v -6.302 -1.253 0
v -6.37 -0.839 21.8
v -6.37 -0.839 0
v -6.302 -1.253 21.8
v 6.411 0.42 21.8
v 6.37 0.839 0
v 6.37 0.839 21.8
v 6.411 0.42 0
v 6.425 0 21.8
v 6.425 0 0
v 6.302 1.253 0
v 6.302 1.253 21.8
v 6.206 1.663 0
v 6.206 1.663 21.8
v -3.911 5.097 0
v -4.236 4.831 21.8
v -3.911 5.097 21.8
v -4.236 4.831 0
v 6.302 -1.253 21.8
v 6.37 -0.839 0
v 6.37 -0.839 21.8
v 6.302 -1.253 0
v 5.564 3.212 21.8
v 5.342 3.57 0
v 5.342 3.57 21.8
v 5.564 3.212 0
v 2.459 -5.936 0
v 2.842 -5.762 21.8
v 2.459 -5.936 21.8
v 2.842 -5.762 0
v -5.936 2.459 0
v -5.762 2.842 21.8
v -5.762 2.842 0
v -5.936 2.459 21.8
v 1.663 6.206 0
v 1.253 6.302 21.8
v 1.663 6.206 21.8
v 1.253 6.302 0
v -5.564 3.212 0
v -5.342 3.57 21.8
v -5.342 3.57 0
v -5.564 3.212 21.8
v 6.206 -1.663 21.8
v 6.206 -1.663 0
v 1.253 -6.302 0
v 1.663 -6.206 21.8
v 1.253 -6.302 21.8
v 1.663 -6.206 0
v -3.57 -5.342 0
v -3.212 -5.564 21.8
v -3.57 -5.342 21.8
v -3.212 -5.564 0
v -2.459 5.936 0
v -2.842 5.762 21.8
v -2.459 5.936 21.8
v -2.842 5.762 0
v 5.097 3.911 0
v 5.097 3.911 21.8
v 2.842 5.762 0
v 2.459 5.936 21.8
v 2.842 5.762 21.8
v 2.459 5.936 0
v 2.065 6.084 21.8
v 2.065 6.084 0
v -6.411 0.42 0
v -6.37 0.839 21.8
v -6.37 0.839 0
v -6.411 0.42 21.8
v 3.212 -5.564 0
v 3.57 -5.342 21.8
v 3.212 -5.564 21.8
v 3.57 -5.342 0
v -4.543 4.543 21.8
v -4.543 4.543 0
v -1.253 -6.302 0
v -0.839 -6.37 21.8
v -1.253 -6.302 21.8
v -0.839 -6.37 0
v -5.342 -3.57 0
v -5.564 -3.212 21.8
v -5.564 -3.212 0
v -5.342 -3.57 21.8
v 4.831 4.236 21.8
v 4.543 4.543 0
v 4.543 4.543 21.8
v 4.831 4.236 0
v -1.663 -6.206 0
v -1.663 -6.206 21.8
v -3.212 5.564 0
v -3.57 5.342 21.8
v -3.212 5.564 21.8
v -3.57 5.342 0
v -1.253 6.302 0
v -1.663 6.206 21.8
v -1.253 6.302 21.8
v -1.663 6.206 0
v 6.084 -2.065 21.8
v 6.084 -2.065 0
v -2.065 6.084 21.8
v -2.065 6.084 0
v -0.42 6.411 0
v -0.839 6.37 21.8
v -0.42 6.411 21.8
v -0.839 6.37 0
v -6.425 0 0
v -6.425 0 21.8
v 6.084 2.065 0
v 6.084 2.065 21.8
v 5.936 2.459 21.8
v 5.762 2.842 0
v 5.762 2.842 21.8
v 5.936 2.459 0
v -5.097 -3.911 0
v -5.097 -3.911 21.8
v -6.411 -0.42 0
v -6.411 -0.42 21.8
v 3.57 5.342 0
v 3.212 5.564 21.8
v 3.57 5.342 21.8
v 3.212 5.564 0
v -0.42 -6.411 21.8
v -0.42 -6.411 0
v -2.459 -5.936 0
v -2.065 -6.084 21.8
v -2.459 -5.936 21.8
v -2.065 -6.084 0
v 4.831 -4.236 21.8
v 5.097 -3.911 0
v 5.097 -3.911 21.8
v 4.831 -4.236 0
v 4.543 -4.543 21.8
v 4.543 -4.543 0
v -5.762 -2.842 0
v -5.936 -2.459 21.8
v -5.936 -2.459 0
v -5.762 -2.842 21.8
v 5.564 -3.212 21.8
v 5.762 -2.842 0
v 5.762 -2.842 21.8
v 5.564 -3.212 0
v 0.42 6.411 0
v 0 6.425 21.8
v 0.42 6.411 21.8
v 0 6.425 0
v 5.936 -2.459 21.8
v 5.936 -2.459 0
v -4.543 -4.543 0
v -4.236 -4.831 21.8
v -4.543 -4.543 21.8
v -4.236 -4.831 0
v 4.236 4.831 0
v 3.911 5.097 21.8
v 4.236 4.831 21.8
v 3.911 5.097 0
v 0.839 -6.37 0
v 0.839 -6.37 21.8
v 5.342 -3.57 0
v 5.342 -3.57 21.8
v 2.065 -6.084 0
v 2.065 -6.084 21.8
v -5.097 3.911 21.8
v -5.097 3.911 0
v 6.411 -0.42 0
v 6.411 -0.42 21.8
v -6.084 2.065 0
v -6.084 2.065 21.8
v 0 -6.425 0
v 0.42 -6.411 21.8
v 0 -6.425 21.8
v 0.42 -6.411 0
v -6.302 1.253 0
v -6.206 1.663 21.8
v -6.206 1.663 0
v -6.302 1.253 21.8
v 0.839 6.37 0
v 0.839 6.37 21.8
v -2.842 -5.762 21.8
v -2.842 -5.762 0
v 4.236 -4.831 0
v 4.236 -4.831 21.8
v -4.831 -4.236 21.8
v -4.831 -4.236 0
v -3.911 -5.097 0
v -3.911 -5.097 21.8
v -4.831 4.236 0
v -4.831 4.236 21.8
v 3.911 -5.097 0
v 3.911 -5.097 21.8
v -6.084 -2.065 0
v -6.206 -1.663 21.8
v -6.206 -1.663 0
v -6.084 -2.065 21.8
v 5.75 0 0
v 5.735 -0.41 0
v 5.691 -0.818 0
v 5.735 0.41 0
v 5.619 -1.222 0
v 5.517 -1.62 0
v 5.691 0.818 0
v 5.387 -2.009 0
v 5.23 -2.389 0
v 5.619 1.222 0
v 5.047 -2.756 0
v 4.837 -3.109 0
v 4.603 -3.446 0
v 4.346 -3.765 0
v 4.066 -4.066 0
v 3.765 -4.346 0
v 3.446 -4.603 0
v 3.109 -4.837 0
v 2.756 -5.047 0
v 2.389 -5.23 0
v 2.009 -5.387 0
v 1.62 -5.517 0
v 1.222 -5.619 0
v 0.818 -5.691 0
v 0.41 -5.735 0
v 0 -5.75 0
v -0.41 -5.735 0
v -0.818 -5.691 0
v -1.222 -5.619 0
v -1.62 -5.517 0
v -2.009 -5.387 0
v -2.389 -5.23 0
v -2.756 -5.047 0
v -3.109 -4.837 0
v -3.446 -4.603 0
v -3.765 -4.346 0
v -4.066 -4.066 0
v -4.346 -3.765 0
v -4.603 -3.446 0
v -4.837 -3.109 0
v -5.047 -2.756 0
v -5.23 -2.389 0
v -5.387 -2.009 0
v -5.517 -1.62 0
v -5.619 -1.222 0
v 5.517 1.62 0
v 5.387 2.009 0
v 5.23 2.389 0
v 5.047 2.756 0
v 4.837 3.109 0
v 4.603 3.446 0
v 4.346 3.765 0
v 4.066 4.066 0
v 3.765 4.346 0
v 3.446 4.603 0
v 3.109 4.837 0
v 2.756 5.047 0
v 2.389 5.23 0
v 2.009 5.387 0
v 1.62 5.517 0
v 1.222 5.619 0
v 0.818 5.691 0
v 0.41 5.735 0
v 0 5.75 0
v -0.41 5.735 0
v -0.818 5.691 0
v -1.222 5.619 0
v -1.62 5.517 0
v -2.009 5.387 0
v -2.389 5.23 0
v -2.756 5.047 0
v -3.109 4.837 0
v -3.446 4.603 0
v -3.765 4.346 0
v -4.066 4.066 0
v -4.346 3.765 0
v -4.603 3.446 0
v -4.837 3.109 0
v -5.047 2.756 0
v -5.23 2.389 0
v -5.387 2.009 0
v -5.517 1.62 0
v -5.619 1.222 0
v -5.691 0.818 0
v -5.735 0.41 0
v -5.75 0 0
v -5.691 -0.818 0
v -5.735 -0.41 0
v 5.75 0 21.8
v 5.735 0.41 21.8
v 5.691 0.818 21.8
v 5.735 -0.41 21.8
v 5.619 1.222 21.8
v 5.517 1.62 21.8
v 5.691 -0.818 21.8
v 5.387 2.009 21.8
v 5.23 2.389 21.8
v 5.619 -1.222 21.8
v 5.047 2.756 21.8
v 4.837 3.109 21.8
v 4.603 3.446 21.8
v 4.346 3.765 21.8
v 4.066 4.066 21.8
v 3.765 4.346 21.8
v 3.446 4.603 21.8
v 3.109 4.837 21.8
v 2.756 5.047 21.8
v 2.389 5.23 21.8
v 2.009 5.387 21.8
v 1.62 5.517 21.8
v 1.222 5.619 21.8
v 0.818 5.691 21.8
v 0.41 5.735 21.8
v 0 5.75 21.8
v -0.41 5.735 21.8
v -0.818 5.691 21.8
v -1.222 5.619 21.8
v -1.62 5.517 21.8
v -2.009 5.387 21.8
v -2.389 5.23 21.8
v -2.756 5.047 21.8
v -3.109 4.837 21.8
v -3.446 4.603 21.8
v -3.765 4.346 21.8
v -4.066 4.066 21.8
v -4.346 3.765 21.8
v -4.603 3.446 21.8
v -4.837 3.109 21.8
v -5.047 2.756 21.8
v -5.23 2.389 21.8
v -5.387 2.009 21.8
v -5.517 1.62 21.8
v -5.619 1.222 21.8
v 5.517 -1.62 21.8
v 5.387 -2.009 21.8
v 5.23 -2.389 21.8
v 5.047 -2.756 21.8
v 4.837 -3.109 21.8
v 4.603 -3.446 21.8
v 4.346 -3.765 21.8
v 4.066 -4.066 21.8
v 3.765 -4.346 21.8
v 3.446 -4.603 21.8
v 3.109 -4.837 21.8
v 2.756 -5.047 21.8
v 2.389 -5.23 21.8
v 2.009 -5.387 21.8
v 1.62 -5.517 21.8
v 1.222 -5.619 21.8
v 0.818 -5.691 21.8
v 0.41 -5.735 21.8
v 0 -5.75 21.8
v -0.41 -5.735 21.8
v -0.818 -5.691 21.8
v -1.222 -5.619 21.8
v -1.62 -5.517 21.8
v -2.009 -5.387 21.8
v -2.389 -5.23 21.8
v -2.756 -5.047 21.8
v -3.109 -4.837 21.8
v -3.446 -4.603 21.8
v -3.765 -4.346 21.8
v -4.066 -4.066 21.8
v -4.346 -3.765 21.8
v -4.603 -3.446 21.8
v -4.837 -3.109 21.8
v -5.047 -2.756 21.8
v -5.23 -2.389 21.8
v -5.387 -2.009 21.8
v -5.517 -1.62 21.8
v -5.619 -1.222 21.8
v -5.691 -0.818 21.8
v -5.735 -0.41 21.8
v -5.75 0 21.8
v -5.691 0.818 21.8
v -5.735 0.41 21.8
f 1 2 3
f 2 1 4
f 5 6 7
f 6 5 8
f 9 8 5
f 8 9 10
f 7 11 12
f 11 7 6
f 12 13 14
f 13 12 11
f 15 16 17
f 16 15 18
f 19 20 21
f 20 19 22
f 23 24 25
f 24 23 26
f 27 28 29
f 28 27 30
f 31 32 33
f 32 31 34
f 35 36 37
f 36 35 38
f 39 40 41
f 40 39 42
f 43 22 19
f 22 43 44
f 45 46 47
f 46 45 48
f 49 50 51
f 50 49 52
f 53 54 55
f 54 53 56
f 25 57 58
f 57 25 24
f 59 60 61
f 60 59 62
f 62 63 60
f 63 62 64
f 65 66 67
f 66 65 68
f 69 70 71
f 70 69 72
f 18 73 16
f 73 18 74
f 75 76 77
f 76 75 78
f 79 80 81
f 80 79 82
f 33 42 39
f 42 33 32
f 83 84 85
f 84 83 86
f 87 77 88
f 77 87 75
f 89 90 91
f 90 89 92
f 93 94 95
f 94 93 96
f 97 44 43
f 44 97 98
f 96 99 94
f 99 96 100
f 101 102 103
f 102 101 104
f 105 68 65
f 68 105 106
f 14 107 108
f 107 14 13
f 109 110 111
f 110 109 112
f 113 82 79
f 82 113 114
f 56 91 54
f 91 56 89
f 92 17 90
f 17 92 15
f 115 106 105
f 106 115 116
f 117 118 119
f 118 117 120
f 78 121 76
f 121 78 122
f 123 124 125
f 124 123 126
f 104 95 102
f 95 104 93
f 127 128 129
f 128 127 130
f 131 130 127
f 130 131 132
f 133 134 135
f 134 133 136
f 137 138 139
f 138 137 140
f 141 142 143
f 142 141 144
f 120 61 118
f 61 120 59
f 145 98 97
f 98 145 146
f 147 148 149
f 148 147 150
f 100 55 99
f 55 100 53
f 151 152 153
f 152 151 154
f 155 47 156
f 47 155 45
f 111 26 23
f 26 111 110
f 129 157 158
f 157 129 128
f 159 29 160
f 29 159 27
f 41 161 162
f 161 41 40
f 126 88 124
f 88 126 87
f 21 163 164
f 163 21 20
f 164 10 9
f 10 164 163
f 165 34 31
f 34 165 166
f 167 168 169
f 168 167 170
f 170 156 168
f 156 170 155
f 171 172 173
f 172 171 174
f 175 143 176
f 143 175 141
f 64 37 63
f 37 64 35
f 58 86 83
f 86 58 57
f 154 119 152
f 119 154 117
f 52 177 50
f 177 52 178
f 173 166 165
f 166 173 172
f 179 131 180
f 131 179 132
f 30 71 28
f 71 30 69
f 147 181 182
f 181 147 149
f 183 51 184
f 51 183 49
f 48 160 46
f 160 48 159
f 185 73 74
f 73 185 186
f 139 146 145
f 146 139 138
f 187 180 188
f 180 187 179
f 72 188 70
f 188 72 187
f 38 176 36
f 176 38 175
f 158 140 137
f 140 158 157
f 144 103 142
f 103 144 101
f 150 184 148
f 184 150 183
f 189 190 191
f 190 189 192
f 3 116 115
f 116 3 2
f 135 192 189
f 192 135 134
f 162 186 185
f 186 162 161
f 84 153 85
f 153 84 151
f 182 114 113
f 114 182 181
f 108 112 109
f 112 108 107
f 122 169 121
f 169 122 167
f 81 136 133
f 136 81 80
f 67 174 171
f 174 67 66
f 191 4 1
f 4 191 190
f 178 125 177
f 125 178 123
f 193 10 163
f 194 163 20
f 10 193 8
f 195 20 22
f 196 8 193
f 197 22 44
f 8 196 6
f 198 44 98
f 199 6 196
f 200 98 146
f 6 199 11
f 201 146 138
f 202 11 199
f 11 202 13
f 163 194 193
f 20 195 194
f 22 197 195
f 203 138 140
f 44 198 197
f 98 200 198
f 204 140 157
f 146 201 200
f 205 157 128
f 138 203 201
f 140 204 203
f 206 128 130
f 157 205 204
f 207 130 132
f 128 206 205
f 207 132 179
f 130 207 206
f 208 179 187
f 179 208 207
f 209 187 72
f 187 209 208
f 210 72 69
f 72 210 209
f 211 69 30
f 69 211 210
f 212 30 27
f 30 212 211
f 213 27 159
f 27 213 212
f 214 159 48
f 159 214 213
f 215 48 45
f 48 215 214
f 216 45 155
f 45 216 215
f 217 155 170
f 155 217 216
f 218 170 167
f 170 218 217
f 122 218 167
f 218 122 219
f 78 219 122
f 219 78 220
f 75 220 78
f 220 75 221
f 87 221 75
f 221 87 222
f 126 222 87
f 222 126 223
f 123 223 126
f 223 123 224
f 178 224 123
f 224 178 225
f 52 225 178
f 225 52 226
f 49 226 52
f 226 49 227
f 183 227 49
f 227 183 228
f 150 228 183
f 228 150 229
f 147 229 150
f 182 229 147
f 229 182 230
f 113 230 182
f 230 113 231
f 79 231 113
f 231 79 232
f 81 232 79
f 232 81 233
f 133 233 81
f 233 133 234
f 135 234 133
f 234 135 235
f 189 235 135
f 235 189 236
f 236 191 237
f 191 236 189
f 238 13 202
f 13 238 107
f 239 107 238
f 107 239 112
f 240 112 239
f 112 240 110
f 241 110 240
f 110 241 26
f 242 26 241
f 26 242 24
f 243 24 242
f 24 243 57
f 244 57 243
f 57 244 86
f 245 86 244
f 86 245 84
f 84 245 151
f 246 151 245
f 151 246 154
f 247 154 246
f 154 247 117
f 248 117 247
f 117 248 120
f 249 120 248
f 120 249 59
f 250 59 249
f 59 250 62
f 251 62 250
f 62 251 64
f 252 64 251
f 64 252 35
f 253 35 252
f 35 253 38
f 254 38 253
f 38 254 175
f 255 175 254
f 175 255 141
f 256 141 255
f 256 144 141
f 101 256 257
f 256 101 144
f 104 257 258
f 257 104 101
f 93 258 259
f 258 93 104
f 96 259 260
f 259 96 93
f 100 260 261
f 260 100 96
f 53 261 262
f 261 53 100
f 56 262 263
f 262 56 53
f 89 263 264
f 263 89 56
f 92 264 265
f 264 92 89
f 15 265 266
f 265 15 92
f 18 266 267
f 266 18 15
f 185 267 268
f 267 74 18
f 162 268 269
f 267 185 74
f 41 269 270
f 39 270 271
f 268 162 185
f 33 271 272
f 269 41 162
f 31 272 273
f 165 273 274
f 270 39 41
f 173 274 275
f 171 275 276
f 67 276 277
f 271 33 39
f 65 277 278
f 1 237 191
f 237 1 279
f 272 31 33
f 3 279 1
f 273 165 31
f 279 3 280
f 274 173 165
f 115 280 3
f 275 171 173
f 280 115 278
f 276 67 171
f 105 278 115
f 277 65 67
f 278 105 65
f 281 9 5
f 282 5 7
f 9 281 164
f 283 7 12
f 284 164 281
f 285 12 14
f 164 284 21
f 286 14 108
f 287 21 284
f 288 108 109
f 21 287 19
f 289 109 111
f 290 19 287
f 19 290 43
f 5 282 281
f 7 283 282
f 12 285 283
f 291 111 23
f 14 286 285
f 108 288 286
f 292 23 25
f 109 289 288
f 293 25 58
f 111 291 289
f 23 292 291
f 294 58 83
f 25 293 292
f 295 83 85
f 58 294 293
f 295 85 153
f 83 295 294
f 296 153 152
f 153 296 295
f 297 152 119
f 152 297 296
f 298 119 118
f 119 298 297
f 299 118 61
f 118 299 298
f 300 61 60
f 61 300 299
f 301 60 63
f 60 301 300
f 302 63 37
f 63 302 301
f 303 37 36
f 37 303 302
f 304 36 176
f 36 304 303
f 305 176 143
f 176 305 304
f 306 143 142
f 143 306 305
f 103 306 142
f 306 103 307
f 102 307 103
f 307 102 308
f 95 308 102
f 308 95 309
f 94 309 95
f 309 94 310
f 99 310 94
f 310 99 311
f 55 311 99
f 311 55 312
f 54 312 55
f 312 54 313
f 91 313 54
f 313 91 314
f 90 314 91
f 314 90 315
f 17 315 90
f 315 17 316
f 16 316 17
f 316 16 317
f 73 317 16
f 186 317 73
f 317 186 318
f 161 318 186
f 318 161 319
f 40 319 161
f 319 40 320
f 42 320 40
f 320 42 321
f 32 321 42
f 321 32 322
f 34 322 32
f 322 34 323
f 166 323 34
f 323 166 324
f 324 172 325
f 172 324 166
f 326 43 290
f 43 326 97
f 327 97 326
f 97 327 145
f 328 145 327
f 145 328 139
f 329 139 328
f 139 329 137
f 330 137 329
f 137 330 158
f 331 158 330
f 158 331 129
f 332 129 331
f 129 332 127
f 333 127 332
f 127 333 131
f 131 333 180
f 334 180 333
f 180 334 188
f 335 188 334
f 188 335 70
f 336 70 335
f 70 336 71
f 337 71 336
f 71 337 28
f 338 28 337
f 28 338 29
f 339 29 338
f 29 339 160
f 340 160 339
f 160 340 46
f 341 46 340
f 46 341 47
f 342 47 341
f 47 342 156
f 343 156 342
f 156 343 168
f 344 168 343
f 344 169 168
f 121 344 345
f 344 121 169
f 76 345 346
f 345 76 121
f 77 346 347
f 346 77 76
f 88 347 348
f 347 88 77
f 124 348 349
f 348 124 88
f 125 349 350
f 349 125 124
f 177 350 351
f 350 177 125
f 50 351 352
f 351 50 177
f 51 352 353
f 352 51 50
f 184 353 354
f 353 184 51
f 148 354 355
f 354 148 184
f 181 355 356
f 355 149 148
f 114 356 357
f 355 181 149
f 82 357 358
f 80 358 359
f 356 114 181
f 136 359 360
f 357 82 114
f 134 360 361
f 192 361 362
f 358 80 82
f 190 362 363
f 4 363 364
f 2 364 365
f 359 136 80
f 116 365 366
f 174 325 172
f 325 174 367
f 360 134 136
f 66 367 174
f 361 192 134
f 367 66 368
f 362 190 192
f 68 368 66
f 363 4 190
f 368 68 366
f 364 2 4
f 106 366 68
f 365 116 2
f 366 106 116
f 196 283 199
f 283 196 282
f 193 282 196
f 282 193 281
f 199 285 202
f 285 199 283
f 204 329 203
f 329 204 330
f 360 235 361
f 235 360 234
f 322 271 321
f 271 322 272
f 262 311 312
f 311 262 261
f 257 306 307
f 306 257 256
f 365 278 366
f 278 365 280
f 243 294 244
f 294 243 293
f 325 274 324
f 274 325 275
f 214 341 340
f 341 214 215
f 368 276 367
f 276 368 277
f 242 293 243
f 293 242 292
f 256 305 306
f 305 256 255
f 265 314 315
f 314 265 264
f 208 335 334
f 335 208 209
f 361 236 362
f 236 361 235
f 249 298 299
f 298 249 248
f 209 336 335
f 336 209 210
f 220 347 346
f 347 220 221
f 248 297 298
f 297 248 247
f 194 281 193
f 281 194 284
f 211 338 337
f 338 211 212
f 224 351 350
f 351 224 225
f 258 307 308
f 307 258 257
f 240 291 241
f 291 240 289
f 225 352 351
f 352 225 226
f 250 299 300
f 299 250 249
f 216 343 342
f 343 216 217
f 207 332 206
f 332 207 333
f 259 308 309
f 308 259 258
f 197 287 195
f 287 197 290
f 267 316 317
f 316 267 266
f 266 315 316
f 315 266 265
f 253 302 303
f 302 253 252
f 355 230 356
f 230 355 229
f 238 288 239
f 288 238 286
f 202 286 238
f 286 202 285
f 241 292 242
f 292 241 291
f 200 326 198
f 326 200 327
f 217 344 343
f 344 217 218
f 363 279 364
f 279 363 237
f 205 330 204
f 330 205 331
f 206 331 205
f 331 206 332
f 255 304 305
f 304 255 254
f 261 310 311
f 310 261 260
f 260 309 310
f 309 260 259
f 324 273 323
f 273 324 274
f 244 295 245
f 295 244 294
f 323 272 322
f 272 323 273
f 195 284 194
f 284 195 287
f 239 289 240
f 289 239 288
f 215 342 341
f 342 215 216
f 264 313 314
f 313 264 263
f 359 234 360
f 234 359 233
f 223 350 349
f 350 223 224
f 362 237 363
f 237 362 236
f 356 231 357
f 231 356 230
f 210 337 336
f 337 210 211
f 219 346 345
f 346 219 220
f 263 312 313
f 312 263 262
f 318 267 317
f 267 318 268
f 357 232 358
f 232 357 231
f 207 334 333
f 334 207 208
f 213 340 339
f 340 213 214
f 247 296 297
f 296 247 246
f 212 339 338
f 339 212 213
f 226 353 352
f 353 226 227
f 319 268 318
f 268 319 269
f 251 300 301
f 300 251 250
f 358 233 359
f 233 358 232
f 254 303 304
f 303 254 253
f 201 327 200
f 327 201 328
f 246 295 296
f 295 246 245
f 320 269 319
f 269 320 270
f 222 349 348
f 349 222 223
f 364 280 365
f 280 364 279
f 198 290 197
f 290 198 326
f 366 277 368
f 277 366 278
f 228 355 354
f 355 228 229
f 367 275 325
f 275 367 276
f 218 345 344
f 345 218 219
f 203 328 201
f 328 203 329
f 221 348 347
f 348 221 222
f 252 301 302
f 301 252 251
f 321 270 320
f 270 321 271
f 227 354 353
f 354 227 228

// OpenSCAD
// part_id: mar11
// name: Mars pointer sleeve
// source_drawing_ids: DRW-013
// units: mm
// revision: 0.1
// SPDX-License-Identifier: MIT

module part_mar11(
    outer_d = 12.85,
    inner_d = 11.5,
    height = 21.8,
    lip_h = 2.0,
    lip_d = 12.5
) {
    difference() {
        union() {
            cylinder(d = outer_d, h = height, center = false, $fn = 96);
            cylinder(d = lip_d, h = lip_h, center = false, $fn = 88);
        }
        translate([0, 0, -0.05]) cylinder(d = inner_d, h = height + 0.1, center = false, $fn = 88);
    }
}

// ---- "main guard" ----
// Default to previewing when opened directly:
if (is_undef(__LIB_MODE__)) {
    part_mar11();
}
